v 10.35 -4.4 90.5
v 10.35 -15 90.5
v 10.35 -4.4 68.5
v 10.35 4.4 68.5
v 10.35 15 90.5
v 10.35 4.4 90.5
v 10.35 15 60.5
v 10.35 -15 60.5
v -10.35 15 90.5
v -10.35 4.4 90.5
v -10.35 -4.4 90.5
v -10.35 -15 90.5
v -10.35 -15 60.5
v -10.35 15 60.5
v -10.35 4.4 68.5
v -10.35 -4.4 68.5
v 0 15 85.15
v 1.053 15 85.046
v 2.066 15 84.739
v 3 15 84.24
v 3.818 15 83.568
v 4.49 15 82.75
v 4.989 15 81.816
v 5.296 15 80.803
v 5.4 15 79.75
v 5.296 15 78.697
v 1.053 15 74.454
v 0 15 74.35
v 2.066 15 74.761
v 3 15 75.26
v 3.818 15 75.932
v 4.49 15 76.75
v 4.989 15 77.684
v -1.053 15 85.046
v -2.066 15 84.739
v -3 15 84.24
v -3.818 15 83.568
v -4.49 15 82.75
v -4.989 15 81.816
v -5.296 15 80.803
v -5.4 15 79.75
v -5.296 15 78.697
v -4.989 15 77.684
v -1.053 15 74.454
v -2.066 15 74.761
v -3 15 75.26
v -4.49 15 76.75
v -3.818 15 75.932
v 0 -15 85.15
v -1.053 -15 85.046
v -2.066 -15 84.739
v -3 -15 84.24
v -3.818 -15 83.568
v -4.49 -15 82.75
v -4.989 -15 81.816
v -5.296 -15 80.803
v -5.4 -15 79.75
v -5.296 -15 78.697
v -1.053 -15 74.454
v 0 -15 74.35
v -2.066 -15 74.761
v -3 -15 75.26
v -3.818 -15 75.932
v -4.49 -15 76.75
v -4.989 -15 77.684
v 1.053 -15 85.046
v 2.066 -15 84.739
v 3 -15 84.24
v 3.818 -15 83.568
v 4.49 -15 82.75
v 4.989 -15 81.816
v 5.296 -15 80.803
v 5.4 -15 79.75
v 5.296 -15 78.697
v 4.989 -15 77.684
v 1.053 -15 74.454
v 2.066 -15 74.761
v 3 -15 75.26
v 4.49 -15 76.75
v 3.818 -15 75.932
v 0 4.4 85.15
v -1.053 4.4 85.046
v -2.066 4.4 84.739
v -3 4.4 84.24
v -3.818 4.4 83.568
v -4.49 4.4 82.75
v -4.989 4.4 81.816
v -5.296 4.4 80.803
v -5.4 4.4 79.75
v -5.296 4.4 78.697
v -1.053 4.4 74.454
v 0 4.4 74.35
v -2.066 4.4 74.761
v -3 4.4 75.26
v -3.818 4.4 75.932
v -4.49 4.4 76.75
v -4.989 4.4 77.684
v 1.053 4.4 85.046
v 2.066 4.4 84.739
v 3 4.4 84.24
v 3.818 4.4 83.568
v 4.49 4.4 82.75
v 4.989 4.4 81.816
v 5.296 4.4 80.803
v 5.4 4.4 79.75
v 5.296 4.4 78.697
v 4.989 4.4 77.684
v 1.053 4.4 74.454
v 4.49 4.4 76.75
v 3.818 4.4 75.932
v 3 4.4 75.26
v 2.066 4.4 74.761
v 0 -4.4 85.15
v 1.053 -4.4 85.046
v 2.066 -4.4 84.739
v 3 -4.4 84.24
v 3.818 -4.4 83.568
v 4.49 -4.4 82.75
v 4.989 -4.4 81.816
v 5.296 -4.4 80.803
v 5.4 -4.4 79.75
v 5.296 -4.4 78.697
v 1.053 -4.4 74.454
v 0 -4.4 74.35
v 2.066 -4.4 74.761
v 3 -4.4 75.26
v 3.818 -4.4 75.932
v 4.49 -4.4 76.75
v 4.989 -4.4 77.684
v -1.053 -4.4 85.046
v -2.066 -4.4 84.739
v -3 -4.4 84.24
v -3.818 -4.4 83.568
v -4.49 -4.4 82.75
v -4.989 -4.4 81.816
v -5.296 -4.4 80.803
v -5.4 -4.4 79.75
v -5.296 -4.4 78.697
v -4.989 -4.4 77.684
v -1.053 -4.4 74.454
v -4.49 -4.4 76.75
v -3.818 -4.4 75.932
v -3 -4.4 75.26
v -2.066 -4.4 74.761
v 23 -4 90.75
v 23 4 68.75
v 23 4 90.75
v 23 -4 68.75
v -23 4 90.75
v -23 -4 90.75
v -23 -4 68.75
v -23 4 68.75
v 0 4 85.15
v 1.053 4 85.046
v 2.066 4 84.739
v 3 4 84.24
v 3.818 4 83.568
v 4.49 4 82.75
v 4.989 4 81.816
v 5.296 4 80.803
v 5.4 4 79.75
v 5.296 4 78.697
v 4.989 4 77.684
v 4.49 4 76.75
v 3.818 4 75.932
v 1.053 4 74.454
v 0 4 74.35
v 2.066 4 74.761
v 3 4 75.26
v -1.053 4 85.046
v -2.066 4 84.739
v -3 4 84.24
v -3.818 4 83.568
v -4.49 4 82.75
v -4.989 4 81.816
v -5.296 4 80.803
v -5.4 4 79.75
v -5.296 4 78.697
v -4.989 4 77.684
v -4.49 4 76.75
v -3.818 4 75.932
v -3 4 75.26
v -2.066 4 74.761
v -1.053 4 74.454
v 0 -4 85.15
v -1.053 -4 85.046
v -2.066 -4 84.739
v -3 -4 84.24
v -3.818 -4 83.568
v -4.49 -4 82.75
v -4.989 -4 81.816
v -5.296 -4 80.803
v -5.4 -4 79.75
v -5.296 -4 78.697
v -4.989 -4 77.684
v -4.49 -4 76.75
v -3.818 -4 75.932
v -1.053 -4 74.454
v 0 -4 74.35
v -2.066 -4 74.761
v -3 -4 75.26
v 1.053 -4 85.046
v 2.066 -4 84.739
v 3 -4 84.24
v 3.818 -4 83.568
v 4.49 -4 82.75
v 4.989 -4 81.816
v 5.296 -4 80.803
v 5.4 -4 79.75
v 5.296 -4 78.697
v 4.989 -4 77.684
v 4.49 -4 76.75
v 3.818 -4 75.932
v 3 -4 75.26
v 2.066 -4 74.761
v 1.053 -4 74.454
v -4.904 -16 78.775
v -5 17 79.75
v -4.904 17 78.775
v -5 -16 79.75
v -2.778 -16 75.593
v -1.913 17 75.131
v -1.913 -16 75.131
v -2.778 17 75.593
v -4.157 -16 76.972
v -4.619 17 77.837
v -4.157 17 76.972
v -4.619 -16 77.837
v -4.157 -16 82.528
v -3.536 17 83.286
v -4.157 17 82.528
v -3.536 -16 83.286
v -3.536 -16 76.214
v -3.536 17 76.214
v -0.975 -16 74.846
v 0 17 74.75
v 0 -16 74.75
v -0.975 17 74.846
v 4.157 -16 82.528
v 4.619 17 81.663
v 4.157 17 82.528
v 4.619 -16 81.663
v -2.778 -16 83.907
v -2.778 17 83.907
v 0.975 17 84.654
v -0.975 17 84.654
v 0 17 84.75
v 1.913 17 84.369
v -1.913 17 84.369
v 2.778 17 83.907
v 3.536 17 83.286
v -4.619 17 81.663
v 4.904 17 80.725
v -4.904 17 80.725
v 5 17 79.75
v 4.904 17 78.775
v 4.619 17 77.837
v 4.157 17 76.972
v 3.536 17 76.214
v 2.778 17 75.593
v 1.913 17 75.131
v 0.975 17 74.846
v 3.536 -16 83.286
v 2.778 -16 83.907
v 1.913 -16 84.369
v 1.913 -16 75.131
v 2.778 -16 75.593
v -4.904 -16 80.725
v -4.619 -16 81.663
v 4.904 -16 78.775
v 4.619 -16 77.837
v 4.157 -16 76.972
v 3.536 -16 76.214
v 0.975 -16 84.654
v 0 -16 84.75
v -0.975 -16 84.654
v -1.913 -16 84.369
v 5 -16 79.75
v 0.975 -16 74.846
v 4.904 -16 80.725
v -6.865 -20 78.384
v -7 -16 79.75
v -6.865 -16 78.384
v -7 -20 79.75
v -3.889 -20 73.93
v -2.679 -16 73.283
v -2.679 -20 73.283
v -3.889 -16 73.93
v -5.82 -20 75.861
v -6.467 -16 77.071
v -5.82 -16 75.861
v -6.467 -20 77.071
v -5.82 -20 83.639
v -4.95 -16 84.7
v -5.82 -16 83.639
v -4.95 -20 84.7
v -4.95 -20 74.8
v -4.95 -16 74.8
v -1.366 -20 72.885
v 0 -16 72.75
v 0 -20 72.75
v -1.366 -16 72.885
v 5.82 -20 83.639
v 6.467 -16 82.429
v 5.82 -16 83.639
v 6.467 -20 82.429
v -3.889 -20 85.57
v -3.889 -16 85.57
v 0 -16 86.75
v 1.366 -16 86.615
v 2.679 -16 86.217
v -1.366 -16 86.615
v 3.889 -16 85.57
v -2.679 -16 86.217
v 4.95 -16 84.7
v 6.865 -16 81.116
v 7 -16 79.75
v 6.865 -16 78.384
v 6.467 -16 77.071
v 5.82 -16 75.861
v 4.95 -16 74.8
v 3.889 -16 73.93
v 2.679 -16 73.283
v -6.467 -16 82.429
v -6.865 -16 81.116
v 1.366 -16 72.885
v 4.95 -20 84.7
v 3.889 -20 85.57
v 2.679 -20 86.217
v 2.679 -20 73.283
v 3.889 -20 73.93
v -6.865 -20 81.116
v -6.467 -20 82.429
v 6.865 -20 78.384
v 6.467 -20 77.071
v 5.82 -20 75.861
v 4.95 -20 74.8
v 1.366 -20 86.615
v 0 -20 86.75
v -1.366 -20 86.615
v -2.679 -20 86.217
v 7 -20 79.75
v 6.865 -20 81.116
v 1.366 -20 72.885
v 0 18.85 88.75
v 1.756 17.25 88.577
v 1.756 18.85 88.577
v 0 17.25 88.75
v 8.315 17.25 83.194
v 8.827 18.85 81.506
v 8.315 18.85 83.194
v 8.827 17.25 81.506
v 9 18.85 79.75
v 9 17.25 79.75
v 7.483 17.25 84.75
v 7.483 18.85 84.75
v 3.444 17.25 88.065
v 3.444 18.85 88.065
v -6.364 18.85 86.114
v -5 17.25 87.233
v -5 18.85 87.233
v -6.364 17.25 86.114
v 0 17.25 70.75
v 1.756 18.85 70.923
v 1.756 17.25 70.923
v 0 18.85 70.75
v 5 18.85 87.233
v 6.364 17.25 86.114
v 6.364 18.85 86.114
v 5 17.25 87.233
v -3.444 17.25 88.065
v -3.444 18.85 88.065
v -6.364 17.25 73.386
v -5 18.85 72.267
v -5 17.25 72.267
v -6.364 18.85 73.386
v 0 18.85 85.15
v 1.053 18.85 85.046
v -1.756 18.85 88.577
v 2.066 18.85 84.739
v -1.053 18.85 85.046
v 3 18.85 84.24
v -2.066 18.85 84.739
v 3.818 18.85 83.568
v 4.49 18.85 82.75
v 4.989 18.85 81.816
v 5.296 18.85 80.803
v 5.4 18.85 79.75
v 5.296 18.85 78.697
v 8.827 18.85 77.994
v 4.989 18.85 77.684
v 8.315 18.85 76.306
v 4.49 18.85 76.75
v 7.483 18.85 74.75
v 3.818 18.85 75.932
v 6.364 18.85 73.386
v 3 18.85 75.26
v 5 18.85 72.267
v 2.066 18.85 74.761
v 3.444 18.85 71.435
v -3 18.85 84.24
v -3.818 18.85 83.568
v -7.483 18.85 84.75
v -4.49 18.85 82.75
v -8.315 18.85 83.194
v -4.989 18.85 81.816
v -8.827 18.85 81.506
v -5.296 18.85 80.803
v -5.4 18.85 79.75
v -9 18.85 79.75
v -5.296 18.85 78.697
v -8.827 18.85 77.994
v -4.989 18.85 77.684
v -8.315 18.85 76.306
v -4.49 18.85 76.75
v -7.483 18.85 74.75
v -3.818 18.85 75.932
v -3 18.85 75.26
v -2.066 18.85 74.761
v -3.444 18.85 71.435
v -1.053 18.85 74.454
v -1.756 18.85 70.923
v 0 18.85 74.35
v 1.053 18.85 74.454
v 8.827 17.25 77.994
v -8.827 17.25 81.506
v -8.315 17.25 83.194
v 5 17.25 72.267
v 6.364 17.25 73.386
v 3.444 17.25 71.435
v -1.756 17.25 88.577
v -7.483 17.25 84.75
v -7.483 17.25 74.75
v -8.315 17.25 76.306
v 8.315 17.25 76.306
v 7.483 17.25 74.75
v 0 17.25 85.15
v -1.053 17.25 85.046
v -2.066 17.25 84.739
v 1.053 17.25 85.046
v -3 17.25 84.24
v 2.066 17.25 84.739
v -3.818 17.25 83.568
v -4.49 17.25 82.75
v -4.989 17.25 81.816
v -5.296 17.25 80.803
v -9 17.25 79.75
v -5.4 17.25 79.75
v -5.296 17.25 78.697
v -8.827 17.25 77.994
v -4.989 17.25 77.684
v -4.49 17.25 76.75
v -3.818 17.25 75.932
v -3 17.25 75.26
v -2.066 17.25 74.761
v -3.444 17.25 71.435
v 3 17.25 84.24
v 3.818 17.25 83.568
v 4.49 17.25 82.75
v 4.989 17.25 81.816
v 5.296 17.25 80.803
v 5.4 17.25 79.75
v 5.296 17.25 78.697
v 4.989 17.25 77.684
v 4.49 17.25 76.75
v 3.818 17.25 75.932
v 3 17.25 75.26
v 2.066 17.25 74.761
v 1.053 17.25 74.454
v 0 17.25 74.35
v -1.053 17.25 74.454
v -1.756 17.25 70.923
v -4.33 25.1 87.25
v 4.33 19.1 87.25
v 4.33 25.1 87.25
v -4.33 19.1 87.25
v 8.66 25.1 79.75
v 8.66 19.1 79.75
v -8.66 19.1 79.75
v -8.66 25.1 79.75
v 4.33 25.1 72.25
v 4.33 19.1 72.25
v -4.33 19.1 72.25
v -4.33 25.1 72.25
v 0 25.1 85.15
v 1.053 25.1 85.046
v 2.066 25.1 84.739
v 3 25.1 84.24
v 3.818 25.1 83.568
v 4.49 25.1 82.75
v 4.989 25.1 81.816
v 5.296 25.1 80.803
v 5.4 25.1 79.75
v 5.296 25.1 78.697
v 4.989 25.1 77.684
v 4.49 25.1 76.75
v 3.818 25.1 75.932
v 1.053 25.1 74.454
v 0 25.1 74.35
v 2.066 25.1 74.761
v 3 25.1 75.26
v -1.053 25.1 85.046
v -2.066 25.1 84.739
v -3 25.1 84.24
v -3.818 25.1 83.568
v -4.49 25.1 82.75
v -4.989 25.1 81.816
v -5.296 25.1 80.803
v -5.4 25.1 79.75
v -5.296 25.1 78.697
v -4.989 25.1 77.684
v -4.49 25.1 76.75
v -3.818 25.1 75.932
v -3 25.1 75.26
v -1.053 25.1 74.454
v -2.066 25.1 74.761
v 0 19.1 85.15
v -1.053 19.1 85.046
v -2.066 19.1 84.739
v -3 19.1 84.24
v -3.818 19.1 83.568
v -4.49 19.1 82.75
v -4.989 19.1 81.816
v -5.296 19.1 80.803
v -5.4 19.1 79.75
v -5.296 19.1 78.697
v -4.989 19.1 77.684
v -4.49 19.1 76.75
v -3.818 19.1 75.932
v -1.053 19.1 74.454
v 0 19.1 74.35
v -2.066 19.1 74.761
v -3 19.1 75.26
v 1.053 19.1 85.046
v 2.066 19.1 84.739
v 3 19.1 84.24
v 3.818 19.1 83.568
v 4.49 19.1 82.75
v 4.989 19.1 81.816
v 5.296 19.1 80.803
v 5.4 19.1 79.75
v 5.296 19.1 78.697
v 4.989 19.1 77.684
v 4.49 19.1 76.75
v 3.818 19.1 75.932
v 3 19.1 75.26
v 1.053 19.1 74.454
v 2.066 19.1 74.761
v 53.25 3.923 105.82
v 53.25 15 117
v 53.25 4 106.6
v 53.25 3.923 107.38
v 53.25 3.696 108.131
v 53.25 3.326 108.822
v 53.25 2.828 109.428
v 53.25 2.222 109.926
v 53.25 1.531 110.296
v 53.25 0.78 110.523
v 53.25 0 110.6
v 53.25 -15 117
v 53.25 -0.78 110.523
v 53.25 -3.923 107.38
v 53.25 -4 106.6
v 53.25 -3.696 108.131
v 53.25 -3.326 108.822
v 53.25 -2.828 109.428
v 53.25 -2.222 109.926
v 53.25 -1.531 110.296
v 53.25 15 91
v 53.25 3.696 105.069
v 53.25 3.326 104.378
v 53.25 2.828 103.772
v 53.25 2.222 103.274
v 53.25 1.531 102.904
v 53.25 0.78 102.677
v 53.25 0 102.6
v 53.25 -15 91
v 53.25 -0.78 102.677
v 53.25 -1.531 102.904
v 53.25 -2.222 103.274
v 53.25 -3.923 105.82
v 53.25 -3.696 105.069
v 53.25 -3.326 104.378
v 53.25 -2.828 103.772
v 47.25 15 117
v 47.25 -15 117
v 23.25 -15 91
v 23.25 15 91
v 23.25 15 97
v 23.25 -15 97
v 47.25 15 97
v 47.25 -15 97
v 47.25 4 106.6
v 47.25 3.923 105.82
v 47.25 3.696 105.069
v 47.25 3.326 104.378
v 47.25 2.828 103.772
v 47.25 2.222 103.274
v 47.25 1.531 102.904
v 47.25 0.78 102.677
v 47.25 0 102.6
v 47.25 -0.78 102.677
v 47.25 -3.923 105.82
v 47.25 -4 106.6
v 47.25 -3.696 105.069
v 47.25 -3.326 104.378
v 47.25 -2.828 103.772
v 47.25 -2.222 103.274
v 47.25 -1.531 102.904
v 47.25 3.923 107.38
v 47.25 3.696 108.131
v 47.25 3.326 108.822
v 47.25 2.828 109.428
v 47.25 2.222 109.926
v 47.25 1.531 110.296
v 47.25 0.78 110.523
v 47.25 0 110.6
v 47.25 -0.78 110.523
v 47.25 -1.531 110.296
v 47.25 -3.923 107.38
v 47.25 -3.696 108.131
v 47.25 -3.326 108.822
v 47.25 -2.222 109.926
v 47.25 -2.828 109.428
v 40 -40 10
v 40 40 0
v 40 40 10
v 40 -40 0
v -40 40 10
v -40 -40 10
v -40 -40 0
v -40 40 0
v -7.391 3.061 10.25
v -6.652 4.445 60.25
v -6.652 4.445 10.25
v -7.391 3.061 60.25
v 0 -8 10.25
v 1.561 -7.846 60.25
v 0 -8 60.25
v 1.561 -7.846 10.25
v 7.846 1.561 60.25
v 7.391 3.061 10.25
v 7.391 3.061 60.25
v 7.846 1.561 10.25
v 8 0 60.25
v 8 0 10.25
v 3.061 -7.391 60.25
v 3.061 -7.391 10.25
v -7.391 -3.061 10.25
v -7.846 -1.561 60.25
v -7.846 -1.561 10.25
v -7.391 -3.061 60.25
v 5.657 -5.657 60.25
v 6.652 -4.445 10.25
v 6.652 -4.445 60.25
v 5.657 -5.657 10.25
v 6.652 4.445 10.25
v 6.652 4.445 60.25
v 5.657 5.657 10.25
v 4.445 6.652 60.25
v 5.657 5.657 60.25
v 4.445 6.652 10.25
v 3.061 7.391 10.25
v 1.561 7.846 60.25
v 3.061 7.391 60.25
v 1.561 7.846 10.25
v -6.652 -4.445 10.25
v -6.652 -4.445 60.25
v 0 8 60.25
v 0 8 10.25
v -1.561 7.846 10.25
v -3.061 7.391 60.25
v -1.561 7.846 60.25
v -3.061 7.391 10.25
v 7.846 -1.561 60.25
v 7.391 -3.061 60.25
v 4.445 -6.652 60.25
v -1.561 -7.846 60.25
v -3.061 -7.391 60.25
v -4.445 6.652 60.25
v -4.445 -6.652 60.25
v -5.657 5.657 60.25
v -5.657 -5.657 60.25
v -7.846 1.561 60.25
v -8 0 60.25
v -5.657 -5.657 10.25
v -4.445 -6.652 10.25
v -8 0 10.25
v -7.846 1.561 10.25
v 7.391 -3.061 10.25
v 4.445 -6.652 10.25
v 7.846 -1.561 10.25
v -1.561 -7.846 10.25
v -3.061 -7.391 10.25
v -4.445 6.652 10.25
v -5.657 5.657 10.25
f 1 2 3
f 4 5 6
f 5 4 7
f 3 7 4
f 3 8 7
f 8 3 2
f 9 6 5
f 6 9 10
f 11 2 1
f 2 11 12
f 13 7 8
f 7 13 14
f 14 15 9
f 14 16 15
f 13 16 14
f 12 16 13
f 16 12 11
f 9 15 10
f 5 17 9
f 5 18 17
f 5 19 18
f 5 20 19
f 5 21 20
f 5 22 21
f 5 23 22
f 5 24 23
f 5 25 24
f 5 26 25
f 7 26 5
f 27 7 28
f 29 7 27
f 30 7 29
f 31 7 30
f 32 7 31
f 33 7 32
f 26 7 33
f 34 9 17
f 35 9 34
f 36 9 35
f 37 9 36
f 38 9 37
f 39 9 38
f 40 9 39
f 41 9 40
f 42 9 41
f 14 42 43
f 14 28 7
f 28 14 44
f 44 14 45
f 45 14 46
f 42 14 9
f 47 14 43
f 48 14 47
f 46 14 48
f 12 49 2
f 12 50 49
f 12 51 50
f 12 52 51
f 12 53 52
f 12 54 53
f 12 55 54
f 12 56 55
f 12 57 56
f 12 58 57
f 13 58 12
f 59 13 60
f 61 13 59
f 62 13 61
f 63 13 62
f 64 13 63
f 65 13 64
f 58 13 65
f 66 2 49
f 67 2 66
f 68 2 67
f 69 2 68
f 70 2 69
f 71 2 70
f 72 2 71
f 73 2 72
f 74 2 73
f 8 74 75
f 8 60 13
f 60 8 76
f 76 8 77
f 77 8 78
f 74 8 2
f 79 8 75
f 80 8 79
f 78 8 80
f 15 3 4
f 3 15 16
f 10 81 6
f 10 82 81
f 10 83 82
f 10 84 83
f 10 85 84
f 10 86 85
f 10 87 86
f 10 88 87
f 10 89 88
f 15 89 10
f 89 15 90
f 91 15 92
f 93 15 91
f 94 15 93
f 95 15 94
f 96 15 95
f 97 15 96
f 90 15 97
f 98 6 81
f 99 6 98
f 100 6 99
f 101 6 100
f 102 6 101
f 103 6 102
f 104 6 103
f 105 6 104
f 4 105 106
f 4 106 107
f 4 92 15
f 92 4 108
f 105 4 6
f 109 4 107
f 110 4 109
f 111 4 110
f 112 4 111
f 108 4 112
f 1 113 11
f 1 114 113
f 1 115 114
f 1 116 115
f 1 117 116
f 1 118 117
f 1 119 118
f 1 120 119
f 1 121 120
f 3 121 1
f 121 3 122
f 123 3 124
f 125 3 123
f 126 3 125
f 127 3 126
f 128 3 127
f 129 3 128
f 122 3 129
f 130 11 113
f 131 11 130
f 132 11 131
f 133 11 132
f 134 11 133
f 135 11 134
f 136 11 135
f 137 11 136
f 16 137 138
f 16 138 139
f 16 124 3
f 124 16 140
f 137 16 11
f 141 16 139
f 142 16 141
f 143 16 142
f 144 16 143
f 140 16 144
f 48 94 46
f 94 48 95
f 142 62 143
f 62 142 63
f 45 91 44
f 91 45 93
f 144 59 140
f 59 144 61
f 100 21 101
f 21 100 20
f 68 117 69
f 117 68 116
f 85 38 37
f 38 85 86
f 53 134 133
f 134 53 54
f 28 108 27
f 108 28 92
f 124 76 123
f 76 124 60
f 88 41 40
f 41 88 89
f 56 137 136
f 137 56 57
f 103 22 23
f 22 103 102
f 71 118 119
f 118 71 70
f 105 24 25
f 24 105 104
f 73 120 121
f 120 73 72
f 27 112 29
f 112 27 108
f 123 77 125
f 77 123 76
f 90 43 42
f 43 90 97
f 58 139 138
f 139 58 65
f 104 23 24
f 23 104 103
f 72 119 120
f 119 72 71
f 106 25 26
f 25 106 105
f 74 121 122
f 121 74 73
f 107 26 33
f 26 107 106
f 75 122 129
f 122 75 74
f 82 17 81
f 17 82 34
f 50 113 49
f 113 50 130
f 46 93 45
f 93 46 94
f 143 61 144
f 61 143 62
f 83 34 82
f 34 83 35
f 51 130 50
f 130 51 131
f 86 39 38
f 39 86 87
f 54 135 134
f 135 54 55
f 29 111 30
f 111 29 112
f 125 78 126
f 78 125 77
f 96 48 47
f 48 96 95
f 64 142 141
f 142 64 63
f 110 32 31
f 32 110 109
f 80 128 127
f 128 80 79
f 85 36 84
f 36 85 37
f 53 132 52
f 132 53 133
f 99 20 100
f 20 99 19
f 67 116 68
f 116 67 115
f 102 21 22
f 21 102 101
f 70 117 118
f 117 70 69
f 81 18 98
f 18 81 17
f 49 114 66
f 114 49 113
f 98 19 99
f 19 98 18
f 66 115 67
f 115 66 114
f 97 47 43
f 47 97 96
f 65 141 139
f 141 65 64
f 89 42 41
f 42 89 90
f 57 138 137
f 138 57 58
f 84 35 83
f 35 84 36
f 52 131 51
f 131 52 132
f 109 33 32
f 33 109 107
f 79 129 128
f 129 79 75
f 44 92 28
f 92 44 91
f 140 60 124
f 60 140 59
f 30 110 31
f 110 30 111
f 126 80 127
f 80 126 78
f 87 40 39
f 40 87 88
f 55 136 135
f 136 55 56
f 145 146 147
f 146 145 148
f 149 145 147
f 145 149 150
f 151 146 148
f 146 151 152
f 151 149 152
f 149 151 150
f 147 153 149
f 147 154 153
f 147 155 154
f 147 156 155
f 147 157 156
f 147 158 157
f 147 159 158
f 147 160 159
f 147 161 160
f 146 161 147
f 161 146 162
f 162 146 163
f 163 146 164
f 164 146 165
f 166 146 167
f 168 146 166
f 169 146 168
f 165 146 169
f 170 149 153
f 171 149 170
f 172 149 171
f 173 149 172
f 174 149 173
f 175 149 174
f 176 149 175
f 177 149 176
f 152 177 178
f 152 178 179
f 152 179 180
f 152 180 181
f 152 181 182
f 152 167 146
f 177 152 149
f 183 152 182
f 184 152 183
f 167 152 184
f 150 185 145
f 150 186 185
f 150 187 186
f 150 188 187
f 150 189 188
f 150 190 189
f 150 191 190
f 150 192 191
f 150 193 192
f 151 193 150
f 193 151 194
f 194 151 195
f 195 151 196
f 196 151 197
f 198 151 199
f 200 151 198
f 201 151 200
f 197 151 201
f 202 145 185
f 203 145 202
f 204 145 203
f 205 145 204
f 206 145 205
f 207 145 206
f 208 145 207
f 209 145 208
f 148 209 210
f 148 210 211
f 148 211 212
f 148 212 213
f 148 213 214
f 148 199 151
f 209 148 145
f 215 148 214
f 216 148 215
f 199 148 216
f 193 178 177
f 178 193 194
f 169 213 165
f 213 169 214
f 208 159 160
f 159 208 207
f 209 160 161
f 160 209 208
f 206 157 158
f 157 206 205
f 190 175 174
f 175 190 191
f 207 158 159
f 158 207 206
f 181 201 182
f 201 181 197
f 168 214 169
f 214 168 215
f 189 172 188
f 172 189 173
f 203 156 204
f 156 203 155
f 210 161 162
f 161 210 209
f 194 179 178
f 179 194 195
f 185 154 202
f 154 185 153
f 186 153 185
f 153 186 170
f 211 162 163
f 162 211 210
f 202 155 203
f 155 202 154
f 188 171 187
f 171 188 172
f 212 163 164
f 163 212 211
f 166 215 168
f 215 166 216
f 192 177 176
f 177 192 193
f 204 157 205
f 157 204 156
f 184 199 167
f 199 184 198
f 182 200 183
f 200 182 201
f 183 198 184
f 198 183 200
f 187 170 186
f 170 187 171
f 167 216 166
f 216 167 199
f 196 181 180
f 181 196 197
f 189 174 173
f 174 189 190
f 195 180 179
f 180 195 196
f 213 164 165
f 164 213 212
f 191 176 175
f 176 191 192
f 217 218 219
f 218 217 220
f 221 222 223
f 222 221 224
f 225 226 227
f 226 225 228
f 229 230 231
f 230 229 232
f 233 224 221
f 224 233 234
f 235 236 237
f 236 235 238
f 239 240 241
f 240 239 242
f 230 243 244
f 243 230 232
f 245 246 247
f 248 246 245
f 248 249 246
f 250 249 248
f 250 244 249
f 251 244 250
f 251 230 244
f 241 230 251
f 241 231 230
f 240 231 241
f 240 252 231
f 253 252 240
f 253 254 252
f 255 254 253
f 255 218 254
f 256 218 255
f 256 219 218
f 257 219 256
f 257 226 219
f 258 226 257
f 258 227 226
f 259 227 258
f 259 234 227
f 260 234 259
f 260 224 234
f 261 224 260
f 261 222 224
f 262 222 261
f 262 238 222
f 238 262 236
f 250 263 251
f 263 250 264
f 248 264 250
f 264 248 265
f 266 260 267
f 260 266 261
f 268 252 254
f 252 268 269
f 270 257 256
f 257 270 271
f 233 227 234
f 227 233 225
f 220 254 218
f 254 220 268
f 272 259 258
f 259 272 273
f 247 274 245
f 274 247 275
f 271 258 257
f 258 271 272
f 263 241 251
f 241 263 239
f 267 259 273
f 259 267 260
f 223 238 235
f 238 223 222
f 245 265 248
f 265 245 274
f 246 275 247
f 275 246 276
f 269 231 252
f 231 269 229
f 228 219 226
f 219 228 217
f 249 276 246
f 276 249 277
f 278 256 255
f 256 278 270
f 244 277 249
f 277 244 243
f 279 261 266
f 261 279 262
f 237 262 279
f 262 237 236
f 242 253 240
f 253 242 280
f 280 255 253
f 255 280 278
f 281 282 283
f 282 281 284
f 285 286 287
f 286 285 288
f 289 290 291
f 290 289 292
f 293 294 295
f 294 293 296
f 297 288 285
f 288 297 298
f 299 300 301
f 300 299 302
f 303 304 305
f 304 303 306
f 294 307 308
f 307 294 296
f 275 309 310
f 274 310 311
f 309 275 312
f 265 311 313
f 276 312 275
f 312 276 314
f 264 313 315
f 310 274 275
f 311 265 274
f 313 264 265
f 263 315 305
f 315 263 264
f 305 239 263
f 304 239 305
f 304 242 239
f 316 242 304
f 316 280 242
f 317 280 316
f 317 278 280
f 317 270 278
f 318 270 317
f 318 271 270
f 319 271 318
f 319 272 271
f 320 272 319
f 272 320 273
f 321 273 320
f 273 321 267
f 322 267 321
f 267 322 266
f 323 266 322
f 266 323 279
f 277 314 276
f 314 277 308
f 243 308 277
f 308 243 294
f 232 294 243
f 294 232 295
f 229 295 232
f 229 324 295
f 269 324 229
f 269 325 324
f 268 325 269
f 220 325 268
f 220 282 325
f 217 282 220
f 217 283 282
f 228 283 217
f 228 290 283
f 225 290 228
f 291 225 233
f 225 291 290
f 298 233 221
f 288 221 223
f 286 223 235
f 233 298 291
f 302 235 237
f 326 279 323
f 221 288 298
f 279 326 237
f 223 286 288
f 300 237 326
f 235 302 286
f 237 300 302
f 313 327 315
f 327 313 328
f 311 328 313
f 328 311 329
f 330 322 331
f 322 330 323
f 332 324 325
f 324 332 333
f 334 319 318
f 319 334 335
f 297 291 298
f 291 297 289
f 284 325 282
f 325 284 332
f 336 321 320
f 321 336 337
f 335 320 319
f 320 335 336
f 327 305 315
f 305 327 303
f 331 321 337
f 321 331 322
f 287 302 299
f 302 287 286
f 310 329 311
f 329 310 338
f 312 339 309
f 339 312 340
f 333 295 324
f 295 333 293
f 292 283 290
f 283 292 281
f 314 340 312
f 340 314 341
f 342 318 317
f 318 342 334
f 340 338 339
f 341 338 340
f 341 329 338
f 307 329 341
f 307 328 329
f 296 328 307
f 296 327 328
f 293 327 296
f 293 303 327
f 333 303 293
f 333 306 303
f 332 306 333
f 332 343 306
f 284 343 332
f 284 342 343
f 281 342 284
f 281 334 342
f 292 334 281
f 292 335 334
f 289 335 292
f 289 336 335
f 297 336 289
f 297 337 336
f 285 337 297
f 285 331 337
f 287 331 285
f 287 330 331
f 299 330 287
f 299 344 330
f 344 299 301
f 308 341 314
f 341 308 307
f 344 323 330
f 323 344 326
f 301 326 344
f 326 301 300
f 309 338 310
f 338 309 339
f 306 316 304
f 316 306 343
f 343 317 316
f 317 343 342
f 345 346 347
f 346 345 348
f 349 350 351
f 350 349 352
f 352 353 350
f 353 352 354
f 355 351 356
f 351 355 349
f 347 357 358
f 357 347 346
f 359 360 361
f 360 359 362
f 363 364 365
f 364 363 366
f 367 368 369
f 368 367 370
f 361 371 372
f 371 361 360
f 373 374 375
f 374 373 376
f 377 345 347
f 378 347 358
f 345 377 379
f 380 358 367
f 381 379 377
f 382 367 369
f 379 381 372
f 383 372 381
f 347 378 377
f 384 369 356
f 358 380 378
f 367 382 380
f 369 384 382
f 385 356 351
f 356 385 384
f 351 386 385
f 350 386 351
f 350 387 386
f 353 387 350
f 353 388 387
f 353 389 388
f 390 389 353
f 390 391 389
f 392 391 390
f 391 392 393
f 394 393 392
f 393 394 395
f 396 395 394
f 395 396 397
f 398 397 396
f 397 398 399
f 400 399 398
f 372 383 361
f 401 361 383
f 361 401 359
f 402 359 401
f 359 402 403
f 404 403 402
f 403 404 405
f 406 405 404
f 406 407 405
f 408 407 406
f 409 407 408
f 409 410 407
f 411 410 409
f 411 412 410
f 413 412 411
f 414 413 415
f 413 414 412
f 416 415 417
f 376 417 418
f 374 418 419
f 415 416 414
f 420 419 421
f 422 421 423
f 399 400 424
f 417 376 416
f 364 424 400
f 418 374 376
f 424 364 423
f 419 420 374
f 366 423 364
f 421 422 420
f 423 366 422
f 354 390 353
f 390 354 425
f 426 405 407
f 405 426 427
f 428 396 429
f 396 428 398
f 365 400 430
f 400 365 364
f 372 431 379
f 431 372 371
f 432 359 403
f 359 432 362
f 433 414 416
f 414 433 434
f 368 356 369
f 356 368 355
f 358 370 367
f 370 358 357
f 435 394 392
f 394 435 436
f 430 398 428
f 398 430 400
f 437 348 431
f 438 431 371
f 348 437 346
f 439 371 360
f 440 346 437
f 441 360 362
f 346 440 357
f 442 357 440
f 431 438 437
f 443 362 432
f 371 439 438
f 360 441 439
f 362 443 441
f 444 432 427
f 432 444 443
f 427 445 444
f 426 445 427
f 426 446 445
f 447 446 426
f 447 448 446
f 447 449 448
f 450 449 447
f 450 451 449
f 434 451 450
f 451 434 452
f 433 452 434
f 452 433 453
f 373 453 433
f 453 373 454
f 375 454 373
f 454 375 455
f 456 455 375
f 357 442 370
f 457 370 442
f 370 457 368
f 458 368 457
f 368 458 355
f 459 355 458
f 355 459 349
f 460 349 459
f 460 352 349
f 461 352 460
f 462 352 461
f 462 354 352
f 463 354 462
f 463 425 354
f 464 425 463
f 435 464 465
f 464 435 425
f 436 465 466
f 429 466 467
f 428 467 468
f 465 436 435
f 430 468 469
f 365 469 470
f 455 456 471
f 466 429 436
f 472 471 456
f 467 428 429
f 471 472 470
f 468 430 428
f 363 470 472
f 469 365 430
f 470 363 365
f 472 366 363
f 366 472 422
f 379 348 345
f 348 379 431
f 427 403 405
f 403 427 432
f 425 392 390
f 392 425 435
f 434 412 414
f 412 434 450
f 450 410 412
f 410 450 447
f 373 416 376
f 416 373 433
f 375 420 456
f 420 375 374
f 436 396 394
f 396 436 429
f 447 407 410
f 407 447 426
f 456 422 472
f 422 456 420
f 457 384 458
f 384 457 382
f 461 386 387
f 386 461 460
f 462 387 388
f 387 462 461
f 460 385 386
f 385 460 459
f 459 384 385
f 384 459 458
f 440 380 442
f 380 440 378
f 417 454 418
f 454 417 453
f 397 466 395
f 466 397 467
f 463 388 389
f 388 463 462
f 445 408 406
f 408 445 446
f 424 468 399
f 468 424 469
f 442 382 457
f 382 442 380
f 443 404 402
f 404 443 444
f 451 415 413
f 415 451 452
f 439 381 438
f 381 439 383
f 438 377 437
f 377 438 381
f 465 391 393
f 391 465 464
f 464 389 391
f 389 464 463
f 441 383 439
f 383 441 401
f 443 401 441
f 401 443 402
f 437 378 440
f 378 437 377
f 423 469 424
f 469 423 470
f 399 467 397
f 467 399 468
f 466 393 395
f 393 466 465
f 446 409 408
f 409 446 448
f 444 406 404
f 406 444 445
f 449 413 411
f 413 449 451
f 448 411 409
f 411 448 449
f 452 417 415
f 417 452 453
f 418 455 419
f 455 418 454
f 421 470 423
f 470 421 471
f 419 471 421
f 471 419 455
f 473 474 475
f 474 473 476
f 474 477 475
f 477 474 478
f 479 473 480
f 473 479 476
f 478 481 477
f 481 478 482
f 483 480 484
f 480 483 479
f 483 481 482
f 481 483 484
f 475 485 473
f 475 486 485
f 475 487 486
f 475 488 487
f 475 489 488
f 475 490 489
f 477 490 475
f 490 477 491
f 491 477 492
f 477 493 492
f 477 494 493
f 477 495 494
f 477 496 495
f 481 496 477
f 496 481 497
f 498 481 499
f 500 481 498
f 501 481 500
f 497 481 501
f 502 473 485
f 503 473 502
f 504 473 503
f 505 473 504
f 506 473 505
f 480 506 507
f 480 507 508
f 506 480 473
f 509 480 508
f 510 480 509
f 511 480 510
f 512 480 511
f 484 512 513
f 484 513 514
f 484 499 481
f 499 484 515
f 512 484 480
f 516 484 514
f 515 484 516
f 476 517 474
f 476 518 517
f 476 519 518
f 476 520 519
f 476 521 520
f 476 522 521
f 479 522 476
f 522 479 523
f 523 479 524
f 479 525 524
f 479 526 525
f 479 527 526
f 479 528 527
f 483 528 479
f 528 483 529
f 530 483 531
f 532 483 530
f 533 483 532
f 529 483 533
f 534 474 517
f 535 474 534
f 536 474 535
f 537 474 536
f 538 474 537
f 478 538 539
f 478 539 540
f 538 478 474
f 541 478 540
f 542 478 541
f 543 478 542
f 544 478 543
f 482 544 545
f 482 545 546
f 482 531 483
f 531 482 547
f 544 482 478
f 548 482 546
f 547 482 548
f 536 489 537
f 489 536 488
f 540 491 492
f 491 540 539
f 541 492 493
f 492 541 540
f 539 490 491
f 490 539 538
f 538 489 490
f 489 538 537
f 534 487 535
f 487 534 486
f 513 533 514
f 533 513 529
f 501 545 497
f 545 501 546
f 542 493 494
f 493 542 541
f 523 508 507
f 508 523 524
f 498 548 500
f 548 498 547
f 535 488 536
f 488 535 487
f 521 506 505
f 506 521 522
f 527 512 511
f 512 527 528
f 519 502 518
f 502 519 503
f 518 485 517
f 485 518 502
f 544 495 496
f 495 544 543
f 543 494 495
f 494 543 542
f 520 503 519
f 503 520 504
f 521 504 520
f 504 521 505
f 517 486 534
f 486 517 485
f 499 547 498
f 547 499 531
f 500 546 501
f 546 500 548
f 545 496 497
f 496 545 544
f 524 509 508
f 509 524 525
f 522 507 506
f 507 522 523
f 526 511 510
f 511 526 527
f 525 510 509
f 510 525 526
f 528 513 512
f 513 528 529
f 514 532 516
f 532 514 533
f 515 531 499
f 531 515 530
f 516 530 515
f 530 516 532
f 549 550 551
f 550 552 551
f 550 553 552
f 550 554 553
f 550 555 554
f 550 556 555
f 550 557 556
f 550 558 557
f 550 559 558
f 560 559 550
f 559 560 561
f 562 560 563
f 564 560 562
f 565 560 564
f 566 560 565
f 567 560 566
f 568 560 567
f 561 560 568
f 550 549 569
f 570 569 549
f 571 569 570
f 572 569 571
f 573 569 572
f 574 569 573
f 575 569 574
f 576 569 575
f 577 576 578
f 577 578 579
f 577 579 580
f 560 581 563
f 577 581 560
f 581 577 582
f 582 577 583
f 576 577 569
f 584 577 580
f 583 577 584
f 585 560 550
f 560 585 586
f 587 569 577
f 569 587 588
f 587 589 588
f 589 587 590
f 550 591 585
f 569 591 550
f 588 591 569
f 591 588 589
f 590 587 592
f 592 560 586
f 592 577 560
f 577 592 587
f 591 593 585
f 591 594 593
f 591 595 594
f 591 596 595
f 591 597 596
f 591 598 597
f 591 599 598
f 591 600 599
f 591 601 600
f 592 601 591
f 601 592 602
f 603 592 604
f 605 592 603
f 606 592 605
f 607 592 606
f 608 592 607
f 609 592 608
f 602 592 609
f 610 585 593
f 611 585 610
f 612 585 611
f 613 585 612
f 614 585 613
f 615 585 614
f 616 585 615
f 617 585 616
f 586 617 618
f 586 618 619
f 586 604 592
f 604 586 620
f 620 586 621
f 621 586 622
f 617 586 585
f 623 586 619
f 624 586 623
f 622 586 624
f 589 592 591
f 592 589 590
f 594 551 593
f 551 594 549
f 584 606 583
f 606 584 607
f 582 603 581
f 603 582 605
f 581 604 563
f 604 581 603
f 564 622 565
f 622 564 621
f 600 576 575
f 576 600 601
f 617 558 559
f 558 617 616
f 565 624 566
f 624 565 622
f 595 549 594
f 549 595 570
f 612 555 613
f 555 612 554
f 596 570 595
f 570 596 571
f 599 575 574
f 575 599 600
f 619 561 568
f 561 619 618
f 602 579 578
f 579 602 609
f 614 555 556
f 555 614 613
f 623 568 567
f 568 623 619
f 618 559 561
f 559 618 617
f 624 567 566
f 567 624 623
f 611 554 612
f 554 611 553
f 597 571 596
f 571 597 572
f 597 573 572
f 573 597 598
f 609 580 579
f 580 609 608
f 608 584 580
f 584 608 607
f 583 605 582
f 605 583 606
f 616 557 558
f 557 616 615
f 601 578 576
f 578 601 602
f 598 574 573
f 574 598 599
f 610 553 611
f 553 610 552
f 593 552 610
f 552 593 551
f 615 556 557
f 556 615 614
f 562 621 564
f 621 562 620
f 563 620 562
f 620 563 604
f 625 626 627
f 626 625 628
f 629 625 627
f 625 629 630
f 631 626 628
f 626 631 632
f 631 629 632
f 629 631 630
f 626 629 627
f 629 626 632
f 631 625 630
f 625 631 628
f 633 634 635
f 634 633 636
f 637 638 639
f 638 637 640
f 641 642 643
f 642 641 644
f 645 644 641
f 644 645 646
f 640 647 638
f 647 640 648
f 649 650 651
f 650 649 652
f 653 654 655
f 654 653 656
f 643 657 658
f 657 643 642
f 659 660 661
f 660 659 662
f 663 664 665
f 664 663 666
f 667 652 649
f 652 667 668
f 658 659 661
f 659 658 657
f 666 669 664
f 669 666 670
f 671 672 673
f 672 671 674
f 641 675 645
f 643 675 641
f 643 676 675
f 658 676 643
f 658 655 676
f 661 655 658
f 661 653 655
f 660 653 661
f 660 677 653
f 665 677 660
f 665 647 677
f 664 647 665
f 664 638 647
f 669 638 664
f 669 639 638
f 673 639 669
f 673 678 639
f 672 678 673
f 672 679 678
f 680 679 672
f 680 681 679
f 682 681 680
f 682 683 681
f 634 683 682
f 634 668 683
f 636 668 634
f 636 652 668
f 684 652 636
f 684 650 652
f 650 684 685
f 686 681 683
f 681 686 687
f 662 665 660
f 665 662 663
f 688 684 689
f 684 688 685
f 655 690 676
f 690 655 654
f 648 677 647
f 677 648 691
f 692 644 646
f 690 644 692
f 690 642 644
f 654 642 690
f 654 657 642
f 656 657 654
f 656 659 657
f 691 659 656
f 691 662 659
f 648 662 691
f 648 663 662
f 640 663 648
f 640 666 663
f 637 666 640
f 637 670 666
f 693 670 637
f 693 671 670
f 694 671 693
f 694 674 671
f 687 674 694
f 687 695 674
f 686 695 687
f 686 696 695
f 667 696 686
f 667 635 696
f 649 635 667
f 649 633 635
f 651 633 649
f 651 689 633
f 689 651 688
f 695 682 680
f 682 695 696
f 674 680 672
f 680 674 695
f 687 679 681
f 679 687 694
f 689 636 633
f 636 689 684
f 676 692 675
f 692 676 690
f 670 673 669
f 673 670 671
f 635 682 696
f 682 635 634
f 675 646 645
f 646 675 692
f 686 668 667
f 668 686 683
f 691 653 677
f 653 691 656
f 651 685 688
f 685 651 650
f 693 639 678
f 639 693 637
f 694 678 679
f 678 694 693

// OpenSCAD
$fn = 32;

// ------------------------------------------------------------------------
// Lamp arm: column d16 x 50 mm, arm 46 mm
// Every part is its own module, assembly() places every instance.
// ------------------------------------------------------------------------

// --- part 1 ---
module lamp_base() {
  difference() {
    translate([-40, -40, 0]) cube([80, 80, 10]);
  }
}

// --- part 2 ---
module lamp_column() {
  cylinder(h = 50, d = 16);
}

// --- part 3 ---
module head_fork() {
  difference() {
    translate([-10.35, -15, 0]) cube([20.7, 30, 30]);
    translate([-11.35, -4.4, 8]) cube([22.7, 8.8, 23]);
    translate([0, 0, 19.25]) rotate([90, 0, 0]) cylinder(h = 32, d = 10.8, center = true);
  }
}

// --- part 4 ---
module lamp_arm() {
  difference() {
    translate([-23, -4, 0]) cube([46, 8, 22]);
    translate([0, 0, 11]) rotate([90, 0, 0]) cylinder(h = 10, d = 10.8, center = true);
  }
}

// --- part 5 ---
module arm_pin() {
  rotate([0, 90, 0]) cylinder(h = 34, d = 10, center = true);
  translate([-20, 0, 0]) rotate([0, 90, 0]) cylinder(h = 4, d = 14);
}

// --- part 6 ---
module arm_washer() {
  difference() {
      translate([0, 0, 0]) cylinder(h = 1.6, d = 18);
      translate([0, 0, -1]) cylinder(h = 3.6, d = 10.8);
    }
}

// --- part 7 ---
module arm_nut() {
  difference() {
    linear_extrude(height = 6) polygon(points = [[8.66, 0], [4.33, 7.5], [-4.33, 7.5], [-8.66, 0], [-4.33, -7.5], [4.33, -7.5]]);
    translate([0, 0, -1]) cylinder(h = 8, d = 10.8);
  }
}

// --- part 8 ---
module shade_bracket() {
  difference() {
    translate([-15, -15, 0]) cube([30, 30, 26]);
    translate([-16, -16, 6]) cube([25, 32, 21]);
    translate([12, 0, 15.6]) rotate([0, 90, 0]) cylinder(h = 8, d = 8, center = true);
  }
}

// --- assembly ---
module assembly() {
  color([0.80, 0.24, 0.20]) translate([0, 0, 0]) rotate([0, 0, 0]) lamp_base();
  color([0.20, 0.45, 0.75]) translate([0, 0, 10.25]) rotate([0, 0, 0]) lamp_column();
  color([0.25, 0.62, 0.32]) translate([0, 0, 60.5]) rotate([0, 0, 0]) head_fork();
  color([0.92, 0.70, 0.18]) translate([0, 0, 68.75]) rotate([0, 0, 0]) lamp_arm();
  color([0.58, 0.35, 0.70]) translate([0, 0, 79.75]) rotate([0, 0, 90]) arm_pin();
  color([0.16, 0.66, 0.66]) translate([0, 18.85, 79.75]) rotate([90, 0, 0]) arm_washer();
  color([0.85, 0.48, 0.18]) translate([0, 25.1, 79.75]) rotate([90, 0, 0]) arm_nut();
  color([0.55, 0.60, 0.65]) translate([38.25, 0, 91]) rotate([0, 0, 0]) shade_bracket();
}

assembly();
